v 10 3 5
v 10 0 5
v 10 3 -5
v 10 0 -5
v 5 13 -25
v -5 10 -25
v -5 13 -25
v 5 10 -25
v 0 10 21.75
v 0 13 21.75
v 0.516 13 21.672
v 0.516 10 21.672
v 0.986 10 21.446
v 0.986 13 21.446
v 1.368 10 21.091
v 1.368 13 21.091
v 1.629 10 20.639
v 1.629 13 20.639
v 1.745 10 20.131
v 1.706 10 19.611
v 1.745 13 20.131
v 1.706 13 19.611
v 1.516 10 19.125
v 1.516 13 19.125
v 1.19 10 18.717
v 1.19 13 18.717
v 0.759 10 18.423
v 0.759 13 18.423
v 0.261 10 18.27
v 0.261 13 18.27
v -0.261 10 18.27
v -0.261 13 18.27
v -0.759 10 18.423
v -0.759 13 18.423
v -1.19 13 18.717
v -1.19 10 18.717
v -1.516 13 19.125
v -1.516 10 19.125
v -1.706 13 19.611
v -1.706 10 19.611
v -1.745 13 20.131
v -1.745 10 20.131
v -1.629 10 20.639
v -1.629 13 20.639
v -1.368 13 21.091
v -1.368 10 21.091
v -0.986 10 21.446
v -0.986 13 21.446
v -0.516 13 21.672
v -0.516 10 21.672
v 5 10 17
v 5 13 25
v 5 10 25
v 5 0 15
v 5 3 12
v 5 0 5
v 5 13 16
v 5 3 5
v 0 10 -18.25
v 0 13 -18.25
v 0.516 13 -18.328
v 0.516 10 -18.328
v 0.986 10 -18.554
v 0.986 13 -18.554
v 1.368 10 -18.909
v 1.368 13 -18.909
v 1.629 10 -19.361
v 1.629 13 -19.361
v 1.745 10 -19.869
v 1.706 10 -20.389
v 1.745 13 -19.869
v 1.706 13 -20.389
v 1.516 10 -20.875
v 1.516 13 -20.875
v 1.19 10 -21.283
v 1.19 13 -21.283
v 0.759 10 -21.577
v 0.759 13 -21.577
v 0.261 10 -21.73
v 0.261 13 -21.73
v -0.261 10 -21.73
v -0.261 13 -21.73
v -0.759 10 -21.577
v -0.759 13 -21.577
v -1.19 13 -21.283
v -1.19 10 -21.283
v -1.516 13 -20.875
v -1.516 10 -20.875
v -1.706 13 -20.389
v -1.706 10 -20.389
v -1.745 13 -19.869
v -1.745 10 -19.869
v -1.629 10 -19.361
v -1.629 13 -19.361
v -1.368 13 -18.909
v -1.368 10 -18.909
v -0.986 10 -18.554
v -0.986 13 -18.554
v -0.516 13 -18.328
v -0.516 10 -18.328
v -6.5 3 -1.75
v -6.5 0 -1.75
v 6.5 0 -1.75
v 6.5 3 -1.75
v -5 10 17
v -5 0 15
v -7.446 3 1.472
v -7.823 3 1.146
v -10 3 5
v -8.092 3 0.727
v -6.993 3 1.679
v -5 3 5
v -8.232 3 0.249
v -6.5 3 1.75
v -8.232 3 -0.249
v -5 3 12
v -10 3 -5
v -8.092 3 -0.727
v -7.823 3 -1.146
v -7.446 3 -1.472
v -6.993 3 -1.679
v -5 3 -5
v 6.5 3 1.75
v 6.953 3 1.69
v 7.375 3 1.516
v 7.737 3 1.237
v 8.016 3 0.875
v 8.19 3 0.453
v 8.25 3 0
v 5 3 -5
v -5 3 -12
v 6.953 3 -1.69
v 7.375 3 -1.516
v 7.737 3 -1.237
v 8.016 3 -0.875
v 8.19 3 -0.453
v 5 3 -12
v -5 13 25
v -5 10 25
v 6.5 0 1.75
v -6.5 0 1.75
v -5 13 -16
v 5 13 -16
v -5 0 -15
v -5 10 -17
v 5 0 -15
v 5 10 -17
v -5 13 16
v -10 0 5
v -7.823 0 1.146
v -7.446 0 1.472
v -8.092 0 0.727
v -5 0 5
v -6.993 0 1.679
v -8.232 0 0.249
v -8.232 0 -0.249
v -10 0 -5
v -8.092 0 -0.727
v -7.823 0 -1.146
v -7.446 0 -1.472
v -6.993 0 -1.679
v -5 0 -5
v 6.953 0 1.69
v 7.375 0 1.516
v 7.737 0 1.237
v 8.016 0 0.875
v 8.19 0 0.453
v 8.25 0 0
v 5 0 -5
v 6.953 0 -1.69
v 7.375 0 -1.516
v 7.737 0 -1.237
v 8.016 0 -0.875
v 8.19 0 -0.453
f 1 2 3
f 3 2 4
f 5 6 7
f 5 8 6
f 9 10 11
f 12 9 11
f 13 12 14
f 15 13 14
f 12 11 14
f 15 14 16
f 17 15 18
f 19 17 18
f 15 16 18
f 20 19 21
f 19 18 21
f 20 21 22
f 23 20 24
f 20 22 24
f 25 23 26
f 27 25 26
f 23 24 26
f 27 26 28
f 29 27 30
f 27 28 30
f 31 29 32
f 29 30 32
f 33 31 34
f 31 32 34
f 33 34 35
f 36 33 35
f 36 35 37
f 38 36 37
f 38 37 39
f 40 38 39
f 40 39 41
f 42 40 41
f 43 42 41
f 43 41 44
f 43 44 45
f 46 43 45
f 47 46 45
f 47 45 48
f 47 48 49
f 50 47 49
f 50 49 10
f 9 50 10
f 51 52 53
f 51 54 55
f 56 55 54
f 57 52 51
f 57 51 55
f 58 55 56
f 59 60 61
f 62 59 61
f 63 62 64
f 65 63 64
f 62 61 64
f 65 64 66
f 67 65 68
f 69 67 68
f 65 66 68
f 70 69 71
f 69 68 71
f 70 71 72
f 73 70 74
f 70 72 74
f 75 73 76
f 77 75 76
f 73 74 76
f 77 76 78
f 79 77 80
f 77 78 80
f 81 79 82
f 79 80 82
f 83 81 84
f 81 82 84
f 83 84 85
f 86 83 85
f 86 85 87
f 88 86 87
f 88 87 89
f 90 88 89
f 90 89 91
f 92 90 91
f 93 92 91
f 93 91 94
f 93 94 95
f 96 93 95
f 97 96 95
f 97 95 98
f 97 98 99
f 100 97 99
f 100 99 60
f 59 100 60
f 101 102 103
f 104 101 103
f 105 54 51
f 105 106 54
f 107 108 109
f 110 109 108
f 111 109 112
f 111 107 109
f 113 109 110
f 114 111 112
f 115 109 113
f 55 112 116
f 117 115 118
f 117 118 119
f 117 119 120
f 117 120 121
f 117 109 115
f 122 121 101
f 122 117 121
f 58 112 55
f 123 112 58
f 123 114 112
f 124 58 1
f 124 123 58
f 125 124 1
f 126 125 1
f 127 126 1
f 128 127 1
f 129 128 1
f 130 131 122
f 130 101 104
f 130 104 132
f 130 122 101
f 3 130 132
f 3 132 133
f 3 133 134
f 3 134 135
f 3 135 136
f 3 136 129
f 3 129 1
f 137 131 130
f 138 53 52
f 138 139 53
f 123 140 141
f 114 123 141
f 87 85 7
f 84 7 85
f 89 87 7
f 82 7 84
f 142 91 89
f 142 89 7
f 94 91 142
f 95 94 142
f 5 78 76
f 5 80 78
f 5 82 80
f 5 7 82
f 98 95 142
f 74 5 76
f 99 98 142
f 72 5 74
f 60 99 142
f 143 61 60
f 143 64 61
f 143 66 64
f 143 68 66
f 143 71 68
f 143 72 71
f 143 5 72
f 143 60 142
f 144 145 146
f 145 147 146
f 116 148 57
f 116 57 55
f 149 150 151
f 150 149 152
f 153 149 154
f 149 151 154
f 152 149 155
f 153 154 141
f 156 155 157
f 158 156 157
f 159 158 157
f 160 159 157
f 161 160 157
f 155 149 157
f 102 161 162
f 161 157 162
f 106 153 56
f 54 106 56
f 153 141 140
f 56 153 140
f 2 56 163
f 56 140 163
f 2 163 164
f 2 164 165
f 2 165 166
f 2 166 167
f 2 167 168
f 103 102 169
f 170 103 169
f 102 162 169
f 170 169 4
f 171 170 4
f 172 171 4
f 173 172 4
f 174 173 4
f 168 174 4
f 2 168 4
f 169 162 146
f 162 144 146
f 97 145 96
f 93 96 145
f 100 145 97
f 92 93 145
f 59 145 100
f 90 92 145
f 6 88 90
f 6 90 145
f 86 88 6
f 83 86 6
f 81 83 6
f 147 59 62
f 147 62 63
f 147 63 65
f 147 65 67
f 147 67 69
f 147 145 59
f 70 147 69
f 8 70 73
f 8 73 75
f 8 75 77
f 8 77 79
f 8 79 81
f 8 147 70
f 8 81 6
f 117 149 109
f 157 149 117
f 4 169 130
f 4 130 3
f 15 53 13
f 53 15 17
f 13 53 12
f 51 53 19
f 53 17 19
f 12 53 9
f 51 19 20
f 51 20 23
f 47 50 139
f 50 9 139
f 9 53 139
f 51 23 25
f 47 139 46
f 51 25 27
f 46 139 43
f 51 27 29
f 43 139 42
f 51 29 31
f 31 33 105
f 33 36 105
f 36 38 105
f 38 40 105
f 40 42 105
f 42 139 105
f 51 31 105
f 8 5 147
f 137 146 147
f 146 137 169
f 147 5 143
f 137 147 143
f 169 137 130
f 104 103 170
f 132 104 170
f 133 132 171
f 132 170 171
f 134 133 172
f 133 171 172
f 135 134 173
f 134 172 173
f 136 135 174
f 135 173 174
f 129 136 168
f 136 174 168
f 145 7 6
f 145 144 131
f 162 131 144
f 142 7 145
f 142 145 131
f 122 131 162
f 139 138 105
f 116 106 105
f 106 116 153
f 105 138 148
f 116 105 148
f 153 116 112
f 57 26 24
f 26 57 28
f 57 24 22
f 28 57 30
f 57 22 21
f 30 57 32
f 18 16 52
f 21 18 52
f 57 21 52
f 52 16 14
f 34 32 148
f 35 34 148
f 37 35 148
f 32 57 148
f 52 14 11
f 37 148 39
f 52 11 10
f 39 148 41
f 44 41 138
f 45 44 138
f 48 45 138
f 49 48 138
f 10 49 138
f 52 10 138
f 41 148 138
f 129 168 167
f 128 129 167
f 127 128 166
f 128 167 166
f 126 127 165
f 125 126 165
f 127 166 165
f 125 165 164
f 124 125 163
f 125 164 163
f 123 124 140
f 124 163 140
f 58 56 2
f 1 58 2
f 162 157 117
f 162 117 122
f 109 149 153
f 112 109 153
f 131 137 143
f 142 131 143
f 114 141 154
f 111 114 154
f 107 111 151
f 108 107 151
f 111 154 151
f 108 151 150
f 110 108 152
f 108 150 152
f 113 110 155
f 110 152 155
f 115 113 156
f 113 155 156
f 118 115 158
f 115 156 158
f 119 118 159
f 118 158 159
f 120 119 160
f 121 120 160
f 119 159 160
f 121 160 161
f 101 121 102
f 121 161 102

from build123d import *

# Parameters (mm, degrees)
SKETCH_1_W          = 20
SKETCH_1_H          = 10
EXTRUDE_1_DEPTH     = 3
SKETCH_2_W          = 8
SKETCH_2_H          = 3
EXTRUDE_2_DEPTH     = 5
SKETCH_3_R          = 1.75
CUT_EXTRUDE_1_DEPTH = 10


with BuildPart() as part:
    # 草图1 → 凸台-拉伸1 (new body)
    with BuildSketch(Plane(origin=(0, 0, 0), x_dir=(1, 0, 0), z_dir=(0, 1, 0))):
        Rectangle(SKETCH_1_W, SKETCH_1_H)
        with BuildLine():
            ThreePointArc((-6.5, -1.75), (-8.25, 0), (-6.5, 1.75))
            Line((-6.5, 1.75), (6.5, 1.75))
            ThreePointArc((6.5, 1.75), (7.737436867, 1.237436867), (8.25, 0))
            ThreePointArc((8.25, 0), (7.737436867, -1.237436867), (6.5, -1.75))
            Line((6.5, -1.75), (-6.5, -1.75))
        make_face(mode=Mode.SUBTRACT)
    extrude(amount=EXTRUDE_1_DEPTH)

    # 草图2 → 凸台-拉伸2 (add, symmetric)
    with BuildSketch(Plane(origin=(0, 0, 0), x_dir=(0, 0, -1), z_dir=(1, 0, 0))):
        with Locations((-21, 11.5)):
            Rectangle(SKETCH_2_W, SKETCH_2_H)
        Polygon((-12, 3), (-5, 3), (-5, 0), (-15, 0), (-17, 10), (-17, 13), (-16, 13), align=None)
        Polygon((16, 13), (17, 13), (17, 10), (15, 0), (5, 0), (5, 3), (12, 3), align=None)
        with Locations((21, 11.5)):
            Rectangle(SKETCH_2_W, SKETCH_2_H)
    extrude(amount=EXTRUDE_2_DEPTH, both=True)

    # 草图3 → 切除-拉伸1 (cut)
    with BuildSketch(Plane(origin=(0, 13, 0), x_dir=(1, 0, 0), z_dir=(0, 1, 0))):
        with Locations(Location((0, 20, 0), (0, 0, 270))):
            Circle(SKETCH_3_R)
        with Locations(Location((0, -20, 0), (0, 0, 270))):
            Circle(SKETCH_3_R)
    extrude(amount=-CUT_EXTRUDE_1_DEPTH, mode=Mode.SUBTRACT)


solid = part.part
